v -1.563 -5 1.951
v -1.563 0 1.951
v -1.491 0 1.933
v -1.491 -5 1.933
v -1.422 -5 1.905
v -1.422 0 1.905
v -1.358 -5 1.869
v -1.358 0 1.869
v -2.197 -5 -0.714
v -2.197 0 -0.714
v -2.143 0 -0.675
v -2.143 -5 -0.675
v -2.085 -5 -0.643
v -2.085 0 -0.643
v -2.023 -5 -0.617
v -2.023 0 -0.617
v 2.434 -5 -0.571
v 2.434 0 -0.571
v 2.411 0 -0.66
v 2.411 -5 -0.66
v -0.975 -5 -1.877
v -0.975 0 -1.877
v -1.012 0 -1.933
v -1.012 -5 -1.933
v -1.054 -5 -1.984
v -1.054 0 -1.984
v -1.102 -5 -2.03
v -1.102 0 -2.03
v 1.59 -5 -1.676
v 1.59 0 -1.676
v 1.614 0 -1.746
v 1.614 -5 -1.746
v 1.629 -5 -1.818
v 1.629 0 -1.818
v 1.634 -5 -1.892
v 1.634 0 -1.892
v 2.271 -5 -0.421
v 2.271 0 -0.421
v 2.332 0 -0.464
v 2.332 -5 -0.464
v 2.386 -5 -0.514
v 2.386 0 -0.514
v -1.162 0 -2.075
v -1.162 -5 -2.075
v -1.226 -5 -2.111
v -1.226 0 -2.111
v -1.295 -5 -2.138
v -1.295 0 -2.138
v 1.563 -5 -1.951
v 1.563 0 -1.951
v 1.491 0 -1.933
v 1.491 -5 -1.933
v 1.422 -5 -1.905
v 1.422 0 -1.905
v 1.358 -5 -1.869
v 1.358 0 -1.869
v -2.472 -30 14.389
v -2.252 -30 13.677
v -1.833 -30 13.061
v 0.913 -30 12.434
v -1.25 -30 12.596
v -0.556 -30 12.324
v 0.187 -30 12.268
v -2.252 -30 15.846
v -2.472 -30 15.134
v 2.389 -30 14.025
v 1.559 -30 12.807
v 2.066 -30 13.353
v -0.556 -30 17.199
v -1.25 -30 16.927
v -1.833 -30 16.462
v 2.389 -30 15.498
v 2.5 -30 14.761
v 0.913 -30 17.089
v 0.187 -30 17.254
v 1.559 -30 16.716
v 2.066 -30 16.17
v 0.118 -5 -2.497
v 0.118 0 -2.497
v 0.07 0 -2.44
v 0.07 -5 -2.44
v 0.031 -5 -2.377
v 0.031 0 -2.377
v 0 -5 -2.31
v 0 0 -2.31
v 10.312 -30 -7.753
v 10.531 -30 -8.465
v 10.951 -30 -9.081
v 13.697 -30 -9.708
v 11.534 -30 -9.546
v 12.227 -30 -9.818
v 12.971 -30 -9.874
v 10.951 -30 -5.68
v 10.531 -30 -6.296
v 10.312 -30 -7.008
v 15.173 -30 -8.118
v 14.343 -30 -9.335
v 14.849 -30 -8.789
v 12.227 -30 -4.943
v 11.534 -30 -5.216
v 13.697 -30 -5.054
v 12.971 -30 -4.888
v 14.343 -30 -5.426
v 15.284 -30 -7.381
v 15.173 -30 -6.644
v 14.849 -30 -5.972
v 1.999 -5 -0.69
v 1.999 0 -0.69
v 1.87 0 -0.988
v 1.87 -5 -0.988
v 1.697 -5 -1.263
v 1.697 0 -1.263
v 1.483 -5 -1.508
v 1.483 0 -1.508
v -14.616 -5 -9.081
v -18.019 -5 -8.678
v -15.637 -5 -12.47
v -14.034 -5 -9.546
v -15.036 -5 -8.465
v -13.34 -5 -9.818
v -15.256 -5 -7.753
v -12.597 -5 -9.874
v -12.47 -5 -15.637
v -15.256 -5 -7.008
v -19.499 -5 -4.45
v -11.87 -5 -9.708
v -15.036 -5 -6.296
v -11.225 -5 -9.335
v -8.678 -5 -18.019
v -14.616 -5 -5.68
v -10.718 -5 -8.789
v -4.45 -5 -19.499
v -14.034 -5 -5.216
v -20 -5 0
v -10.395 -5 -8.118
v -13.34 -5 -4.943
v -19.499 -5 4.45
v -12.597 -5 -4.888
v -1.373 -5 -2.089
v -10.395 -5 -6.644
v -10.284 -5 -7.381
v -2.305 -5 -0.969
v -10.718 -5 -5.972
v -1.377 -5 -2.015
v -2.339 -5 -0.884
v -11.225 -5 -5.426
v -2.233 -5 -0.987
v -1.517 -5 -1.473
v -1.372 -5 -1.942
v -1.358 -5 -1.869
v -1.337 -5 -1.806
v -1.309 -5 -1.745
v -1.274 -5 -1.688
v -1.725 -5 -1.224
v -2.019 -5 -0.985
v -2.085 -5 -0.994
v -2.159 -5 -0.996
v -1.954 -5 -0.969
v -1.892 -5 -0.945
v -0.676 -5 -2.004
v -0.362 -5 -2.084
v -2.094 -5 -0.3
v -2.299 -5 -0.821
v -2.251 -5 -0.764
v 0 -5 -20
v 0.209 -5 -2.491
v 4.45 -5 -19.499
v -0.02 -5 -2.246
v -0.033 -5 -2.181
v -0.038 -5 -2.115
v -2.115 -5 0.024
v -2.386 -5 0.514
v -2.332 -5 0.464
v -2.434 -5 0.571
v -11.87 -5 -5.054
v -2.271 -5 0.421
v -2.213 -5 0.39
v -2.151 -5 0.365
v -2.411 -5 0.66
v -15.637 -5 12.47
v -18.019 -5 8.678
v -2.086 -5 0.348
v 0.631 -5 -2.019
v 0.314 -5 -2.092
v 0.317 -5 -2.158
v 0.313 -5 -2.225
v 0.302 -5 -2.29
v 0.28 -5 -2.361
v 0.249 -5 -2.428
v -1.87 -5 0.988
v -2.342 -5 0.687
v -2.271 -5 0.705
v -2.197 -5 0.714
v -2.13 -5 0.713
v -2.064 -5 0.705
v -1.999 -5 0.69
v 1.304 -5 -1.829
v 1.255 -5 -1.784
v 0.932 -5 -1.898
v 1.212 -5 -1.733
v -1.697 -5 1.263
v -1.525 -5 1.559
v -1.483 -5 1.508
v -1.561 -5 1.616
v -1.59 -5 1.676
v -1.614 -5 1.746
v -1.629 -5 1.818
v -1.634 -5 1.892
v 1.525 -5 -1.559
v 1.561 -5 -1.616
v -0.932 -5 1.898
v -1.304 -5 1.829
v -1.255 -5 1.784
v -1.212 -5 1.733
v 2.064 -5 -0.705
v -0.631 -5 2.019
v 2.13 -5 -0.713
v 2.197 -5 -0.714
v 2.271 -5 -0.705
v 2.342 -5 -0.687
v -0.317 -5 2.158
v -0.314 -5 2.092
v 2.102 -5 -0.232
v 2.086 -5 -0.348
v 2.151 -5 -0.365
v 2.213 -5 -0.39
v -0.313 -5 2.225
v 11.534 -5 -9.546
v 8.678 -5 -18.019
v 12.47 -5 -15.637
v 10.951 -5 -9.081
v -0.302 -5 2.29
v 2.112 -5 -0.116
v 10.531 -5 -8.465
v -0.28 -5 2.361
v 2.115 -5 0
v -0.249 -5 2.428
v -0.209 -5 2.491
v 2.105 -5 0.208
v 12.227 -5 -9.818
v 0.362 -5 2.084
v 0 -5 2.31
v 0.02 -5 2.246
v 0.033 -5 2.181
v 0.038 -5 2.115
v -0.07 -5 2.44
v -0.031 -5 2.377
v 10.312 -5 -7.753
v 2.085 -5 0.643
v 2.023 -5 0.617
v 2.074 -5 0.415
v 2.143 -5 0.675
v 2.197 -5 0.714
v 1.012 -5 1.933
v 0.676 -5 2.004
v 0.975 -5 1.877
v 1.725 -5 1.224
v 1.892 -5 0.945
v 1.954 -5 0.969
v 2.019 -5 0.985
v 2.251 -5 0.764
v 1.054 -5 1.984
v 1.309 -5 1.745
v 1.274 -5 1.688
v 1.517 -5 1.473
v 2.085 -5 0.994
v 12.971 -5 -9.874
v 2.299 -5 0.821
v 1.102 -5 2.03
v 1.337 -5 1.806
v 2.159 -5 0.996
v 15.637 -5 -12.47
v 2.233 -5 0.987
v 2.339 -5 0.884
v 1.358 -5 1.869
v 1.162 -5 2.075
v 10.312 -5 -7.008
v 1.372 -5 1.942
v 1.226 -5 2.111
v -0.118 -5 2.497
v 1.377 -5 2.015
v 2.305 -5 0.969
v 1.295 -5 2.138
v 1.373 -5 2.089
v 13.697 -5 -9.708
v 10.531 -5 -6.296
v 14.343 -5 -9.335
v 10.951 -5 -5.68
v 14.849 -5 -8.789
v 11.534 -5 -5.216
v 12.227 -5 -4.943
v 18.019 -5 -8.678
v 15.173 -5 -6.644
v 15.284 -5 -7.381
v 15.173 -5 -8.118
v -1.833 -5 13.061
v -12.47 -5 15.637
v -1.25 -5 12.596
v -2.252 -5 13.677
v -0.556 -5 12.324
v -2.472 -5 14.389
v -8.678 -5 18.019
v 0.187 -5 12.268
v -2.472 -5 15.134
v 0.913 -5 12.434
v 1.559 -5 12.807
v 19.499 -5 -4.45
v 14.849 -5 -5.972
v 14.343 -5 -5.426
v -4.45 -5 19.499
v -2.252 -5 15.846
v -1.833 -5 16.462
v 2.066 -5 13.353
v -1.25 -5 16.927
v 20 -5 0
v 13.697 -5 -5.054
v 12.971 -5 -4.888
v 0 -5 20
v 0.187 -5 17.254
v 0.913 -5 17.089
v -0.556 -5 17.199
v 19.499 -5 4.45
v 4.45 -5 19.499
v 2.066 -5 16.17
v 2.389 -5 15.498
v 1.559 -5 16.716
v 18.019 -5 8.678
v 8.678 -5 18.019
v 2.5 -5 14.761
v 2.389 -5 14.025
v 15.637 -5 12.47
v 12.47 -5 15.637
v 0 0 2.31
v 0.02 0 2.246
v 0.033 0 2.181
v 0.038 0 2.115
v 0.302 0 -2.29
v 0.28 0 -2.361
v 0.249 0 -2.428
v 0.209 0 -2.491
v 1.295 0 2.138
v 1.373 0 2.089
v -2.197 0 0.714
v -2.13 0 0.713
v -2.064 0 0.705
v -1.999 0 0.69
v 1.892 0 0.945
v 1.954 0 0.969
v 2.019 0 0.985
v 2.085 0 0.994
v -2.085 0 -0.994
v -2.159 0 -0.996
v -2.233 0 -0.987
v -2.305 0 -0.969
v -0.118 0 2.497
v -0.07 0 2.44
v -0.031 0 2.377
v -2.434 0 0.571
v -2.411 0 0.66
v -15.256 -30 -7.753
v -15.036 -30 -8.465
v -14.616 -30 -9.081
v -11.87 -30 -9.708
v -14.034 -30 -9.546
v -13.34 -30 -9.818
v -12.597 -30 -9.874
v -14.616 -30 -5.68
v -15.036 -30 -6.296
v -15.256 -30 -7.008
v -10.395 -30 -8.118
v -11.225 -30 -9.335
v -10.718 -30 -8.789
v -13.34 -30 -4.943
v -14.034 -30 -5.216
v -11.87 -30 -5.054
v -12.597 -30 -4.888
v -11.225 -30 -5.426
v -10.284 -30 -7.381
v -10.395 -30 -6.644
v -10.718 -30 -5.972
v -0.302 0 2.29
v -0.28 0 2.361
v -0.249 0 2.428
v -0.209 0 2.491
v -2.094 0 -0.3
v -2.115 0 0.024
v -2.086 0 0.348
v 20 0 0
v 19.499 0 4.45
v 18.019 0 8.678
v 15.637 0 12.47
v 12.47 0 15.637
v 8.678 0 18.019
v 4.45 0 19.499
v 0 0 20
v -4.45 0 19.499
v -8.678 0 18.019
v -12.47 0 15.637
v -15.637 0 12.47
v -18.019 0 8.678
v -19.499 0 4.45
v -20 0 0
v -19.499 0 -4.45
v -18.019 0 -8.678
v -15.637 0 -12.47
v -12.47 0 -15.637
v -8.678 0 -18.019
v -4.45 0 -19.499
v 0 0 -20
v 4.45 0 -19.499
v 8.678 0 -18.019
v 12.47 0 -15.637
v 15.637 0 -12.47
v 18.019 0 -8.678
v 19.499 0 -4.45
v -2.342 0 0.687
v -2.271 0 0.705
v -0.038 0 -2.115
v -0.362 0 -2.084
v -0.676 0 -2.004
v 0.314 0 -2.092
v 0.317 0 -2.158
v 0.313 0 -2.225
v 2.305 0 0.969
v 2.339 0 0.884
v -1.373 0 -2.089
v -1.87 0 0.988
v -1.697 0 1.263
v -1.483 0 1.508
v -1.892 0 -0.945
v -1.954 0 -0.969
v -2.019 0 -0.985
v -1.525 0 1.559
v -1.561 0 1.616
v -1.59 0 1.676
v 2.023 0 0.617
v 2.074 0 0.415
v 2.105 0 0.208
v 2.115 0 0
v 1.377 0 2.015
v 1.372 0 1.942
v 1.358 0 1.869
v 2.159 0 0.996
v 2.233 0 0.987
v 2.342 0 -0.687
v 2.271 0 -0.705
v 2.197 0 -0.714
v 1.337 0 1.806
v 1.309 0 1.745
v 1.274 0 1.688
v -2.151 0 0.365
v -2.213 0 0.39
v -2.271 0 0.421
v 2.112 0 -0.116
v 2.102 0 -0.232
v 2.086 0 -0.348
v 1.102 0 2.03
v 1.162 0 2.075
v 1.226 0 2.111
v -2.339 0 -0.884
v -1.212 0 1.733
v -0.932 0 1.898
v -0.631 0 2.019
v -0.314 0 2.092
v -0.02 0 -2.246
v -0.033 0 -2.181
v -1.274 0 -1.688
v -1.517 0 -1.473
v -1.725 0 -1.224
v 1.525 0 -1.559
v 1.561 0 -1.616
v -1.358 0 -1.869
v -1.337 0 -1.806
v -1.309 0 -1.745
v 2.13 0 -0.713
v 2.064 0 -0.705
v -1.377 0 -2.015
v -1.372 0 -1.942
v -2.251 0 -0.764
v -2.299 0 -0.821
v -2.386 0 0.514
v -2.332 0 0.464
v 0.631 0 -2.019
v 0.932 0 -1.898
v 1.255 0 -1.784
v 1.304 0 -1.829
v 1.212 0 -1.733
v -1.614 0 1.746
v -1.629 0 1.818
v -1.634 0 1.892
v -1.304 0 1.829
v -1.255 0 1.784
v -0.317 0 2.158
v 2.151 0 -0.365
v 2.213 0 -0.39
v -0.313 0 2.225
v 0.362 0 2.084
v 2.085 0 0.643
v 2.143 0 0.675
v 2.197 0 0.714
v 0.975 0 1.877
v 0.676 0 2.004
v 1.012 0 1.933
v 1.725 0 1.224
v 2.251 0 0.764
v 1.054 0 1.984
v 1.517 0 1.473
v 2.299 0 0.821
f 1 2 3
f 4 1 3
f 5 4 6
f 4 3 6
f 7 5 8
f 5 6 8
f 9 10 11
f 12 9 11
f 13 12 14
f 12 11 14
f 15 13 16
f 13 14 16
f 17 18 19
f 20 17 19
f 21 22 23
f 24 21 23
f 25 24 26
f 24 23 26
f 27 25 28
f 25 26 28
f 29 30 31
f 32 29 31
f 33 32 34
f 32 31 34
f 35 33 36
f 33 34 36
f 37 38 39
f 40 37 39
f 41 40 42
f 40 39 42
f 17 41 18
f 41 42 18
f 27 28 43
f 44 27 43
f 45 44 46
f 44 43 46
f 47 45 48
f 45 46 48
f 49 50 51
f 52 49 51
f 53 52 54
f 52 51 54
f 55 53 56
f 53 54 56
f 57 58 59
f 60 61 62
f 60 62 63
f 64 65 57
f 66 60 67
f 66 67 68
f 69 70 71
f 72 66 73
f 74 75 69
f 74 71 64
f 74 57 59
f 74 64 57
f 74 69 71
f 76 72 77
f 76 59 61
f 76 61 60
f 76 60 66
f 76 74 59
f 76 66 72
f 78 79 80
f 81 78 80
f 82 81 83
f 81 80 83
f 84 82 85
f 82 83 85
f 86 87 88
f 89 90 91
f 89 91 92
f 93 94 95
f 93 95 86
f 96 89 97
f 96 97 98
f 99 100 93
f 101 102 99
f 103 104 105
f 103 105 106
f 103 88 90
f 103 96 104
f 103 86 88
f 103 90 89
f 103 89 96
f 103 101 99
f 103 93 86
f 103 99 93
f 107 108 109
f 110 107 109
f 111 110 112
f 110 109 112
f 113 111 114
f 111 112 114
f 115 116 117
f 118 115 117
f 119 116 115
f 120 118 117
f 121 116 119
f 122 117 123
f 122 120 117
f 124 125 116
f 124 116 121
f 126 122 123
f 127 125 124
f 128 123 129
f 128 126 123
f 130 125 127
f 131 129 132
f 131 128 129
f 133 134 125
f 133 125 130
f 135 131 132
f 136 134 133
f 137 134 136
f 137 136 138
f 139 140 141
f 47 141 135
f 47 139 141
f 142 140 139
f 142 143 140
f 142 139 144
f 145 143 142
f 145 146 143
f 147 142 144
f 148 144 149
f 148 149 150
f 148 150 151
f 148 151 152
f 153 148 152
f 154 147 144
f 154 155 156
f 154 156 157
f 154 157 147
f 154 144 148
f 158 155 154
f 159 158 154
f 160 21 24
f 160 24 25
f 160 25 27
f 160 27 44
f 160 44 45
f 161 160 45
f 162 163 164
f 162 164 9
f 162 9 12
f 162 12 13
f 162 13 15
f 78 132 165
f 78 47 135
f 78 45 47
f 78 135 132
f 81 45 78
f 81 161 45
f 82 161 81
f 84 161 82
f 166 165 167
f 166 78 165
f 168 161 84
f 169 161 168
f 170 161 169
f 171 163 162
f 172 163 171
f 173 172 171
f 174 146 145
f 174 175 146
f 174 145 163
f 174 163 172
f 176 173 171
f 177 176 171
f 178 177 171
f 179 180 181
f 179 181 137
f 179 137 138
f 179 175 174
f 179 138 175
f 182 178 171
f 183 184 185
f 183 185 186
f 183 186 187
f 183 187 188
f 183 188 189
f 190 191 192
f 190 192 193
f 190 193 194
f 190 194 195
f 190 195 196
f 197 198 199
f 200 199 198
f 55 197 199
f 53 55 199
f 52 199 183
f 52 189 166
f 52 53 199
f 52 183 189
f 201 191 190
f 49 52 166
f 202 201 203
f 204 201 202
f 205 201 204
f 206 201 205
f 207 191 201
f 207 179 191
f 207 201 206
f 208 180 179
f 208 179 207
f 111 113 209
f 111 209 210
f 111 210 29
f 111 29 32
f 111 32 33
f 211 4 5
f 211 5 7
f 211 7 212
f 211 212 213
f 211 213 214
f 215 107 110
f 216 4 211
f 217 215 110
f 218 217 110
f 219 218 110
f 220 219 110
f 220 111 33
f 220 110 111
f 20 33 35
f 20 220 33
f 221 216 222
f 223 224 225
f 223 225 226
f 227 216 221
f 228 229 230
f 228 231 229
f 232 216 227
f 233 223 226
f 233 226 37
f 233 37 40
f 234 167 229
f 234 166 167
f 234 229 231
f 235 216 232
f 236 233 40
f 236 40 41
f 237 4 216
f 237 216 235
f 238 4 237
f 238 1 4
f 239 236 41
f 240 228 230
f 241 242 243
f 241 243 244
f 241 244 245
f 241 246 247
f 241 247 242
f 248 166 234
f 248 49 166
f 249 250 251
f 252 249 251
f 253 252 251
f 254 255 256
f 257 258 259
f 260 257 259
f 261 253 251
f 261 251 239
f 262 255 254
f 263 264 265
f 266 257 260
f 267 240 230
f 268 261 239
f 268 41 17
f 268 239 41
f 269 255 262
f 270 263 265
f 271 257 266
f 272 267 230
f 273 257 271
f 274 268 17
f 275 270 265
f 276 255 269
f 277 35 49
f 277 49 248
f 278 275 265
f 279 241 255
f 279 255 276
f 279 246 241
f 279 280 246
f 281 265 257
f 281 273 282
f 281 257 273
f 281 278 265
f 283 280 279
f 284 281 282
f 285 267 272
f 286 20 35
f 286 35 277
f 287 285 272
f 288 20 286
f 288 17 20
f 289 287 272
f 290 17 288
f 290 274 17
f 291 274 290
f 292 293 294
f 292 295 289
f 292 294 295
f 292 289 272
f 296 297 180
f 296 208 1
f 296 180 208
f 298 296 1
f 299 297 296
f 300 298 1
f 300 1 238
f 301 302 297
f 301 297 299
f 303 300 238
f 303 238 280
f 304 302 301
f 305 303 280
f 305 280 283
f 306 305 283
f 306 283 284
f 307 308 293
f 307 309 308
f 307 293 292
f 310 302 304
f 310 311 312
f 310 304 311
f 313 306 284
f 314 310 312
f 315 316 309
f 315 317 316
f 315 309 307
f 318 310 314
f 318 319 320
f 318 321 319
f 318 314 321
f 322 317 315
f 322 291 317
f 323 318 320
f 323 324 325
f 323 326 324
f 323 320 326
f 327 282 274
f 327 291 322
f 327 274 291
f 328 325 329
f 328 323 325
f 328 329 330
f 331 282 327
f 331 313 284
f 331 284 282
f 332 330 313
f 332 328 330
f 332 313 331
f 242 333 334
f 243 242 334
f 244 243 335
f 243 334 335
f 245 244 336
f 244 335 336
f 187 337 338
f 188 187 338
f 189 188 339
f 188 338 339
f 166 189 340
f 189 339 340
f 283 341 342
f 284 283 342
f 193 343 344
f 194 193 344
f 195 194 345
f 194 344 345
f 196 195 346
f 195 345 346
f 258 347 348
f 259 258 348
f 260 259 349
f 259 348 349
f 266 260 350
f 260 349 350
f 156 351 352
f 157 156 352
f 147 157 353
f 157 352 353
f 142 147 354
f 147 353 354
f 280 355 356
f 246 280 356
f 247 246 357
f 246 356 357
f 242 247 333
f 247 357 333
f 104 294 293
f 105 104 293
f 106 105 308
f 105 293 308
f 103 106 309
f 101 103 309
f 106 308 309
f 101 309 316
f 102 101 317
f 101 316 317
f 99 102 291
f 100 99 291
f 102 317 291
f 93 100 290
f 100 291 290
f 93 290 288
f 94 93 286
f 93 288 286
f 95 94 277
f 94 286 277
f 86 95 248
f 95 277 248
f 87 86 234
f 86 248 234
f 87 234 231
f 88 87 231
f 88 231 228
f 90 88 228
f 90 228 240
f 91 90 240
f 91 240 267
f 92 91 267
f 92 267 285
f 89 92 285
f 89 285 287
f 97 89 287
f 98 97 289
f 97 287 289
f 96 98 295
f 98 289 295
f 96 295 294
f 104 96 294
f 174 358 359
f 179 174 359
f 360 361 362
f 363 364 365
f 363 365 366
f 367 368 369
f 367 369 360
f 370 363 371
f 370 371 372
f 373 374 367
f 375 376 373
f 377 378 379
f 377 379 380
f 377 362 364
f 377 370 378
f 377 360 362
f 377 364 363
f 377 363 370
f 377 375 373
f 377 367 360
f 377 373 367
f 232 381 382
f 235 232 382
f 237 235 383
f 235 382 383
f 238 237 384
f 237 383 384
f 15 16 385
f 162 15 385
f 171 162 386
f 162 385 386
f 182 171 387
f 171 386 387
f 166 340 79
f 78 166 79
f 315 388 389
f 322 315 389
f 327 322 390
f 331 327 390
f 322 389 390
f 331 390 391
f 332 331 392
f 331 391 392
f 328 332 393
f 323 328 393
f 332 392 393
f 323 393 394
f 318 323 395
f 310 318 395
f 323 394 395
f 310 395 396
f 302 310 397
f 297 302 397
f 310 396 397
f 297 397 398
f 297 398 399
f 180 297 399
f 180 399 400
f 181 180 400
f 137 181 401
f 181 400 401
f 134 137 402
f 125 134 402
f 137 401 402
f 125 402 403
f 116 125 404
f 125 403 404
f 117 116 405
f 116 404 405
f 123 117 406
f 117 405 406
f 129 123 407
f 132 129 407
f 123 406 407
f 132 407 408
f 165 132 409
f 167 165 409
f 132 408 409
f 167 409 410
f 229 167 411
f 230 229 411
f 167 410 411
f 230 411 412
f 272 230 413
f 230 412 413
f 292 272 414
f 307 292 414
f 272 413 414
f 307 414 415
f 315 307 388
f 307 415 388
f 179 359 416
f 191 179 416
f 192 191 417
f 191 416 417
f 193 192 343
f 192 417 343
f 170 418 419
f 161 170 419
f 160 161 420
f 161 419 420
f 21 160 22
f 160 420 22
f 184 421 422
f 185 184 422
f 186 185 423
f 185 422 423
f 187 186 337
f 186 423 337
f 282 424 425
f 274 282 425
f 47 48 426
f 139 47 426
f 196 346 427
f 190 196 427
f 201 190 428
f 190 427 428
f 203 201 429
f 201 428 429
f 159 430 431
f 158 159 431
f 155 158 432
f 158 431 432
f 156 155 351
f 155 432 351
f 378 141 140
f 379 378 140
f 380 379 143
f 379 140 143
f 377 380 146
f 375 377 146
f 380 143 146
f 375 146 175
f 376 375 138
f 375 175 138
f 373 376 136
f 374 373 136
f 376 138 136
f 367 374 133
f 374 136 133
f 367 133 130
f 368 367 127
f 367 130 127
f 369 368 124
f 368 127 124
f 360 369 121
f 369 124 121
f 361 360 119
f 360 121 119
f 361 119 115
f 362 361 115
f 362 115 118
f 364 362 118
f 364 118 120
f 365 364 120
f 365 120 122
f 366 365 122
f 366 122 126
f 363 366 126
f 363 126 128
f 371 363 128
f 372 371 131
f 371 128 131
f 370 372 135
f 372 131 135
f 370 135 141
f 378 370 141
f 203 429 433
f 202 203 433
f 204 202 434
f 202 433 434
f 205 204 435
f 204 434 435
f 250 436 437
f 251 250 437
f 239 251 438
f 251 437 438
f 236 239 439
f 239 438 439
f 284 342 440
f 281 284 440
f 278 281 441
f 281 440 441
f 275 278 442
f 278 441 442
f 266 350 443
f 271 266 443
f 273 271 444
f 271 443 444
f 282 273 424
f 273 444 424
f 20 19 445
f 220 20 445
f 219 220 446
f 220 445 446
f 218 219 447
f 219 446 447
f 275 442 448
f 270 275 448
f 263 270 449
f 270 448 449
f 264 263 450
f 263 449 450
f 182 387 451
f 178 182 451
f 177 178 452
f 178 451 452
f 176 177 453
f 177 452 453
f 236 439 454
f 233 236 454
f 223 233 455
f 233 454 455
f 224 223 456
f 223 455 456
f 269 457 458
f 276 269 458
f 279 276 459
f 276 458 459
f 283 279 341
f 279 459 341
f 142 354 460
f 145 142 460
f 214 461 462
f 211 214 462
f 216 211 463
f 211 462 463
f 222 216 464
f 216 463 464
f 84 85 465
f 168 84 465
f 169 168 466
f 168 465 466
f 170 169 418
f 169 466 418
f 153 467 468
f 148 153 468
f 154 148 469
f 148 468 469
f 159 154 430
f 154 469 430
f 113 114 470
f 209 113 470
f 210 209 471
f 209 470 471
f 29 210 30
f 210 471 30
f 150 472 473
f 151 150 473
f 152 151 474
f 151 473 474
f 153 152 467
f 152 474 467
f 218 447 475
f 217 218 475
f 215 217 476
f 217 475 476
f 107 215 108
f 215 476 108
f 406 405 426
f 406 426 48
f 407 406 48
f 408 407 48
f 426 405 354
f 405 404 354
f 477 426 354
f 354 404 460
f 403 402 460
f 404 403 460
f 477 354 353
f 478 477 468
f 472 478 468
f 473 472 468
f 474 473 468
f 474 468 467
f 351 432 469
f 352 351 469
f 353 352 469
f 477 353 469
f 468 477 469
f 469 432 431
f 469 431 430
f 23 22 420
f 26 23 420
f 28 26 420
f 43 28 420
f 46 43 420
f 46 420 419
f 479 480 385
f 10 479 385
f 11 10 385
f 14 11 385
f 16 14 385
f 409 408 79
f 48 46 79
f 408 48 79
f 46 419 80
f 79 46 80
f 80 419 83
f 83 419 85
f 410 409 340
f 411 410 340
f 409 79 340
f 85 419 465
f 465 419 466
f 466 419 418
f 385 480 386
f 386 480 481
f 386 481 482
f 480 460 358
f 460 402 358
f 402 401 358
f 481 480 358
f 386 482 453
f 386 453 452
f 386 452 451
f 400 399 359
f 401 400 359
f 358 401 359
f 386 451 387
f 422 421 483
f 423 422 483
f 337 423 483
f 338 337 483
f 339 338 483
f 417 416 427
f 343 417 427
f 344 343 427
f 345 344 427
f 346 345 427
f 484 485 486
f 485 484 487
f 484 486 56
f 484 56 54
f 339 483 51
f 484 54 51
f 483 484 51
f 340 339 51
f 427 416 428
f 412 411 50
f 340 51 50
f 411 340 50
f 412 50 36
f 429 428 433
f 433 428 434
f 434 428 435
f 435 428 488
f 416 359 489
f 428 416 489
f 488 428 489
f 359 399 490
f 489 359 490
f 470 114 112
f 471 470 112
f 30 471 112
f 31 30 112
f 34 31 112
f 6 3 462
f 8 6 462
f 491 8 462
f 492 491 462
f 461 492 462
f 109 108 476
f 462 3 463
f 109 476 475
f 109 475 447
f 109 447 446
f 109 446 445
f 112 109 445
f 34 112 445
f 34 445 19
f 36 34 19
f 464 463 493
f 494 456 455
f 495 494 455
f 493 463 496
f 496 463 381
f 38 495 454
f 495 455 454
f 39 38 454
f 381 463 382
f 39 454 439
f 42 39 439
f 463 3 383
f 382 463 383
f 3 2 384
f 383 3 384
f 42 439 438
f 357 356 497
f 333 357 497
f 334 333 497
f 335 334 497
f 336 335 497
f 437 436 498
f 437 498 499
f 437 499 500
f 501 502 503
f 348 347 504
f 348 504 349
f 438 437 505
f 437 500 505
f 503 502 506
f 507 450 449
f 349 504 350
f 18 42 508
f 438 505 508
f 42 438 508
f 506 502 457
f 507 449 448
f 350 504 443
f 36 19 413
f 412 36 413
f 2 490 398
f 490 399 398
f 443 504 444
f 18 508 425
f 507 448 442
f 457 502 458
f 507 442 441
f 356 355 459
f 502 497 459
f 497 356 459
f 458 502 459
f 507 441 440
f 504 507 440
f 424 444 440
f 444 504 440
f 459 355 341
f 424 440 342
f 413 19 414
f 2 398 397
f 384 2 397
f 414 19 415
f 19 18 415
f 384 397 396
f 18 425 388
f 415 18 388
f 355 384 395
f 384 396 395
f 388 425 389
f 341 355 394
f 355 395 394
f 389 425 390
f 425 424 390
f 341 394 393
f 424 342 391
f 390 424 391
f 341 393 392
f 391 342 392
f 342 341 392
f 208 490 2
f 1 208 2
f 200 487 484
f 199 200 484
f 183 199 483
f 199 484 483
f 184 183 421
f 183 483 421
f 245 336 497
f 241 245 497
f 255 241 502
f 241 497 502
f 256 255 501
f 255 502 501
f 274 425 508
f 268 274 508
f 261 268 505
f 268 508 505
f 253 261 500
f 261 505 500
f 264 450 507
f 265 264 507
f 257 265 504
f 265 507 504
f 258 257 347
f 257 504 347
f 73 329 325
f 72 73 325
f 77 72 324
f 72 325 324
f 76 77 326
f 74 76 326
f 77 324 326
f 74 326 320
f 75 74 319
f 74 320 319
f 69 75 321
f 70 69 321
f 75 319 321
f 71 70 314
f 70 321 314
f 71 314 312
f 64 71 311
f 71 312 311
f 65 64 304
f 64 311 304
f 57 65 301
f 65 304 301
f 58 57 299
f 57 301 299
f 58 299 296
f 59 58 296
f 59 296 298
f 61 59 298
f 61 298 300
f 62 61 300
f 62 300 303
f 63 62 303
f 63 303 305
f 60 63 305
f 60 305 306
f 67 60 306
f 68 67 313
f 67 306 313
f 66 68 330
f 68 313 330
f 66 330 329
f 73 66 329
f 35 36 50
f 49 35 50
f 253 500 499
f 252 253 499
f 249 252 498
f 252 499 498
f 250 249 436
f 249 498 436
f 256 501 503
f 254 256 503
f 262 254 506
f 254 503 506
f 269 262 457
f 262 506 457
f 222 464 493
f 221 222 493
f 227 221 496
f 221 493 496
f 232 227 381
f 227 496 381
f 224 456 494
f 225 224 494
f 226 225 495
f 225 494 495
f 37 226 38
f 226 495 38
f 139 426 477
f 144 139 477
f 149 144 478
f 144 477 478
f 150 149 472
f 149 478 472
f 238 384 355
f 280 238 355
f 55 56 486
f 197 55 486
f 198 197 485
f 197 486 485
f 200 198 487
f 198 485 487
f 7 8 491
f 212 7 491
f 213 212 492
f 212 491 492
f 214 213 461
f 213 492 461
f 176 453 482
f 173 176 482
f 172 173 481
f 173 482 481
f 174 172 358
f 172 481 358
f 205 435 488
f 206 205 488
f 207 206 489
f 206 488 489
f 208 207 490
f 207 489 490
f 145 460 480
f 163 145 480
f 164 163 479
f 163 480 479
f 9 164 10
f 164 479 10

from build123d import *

# Parameters (mm, degrees)
F0_R     = 20
F1_DEPTH = 5
F2_R     = 2.5
F3_DEPTH = 25


with BuildPart() as f1:
    # F0 (on Front) → F1 (new body)
    with BuildSketch(Plane.XZ):
        Circle(F0_R)
        with BuildLine():
            ThreePointArc((2.022994, 0.617024), (2.091872, 0.311923), (2.115, 0))
            ThreePointArc((2.115, 0), (2.107794, -0.17444), (2.086225, -0.347692))
            ThreePointArc((2.086225, -0.347692), (2.181907, -0.376409), (2.271319, -0.420964))
            ThreePointArc((2.271319, -0.420964), (2.360037, -0.487855), (2.433965, -0.570799))
            Line((2.433965, -0.570799), (2.411372, -0.65976))
            ThreePointArc((2.411372, -0.65976), (2.306825, -0.697377), (2.196941, -0.713829))
            ThreePointArc((2.196941, -0.713829), (2.097104, -0.710321), (1.999314, -0.689903))
            ThreePointArc((1.999314, -0.689903), (1.788714, -1.128595), (1.483424, -1.507541))
            ThreePointArc((1.483424, -1.507541), (1.543952, -1.587014), (1.590099, -1.675615))
            ThreePointArc((1.590099, -1.675615), (1.622556, -1.781878), (1.633612, -1.892435))
            Line((1.633612, -1.892435), (1.563044, -1.951126))
            ThreePointArc((1.563044, -1.951126), (1.456352, -1.920108), (1.357784, -1.868829))
            ThreePointArc((1.357784, -1.868829), (1.279077, -1.807308), (1.211964, -1.733311))
            ThreePointArc((1.211964, -1.733311), (0.783729, -1.964432), (0.314005, -2.091561))
            ThreePointArc((0.314005, -2.091561), (0.31626, -2.191433), (0.301516, -2.290238))
            ThreePointArc((0.301516, -2.290238), (0.265314, -2.395284), (0.209274, -2.491225))
            Line((0.209274, -2.491225), (0.117686, -2.497228))
            ThreePointArc((0.117686, -2.497228), (0.049603, -2.409422), (0, -2.31))
            ThreePointArc((0, -2.31), (-0.027515, -2.213966), (-0.038315, -2.114653))
            ThreePointArc((-0.038315, -2.114653), (-0.520614, -2.049923), (-0.975353, -1.876675))
            ThreePointArc((-0.975353, -1.876675), (-1.032233, -1.9588), (-1.102237, -2.030068))
            ThreePointArc((-1.102237, -2.030068), (-1.193269, -2.093773), (-1.294999, -2.138452))
            Line((-1.294999, -2.138452), (-1.372624, -2.089475))
            ThreePointArc((-1.372624, -2.089475), (-1.376094, -1.97842), (-1.357784, -1.868829))
            ThreePointArc((-1.357784, -1.868829), (-1.323596, -1.774963), (-1.273959, -1.688269))
            ThreePointArc((-1.273959, -1.688269), (-1.6261, -1.352413), (-1.89216, -0.944964))
            ThreePointArc((-1.89216, -0.944964), (-1.986447, -0.977971), (-2.084972, -0.994481))
            ThreePointArc((-2.084972, -0.994481), (-2.196064, -0.992512), (-2.304627, -0.968863))
            Line((-2.304627, -0.968863), (-2.338638, -0.883612))
            ThreePointArc((-2.338638, -0.883612), (-2.276169, -0.791728), (-2.196941, -0.713829))
            ThreePointArc((-2.196941, -0.713829), (-2.114109, -0.657985), (-2.022994, -0.617024))
            ThreePointArc((-2.022994, -0.617024), (-2.110472, -0.138328), (-2.086225, 0.347692))
            ThreePointArc((-2.086225, 0.347692), (-2.181907, 0.376409), (-2.271319, 0.420964))
            ThreePointArc((-2.271319, 0.420964), (-2.360037, 0.487855), (-2.433965, 0.570799))
            Line((-2.433965, 0.570799), (-2.411372, 0.65976))
            ThreePointArc((-2.411372, 0.65976), (-2.306825, 0.697377), (-2.196941, 0.713829))
            ThreePointArc((-2.196941, 0.713829), (-2.097104, 0.710321), (-1.999314, 0.689903))
            ThreePointArc((-1.999314, 0.689903), (-1.788714, 1.128595), (-1.483424, 1.507541))
            ThreePointArc((-1.483424, 1.507541), (-1.543952, 1.587014), (-1.590099, 1.675615))
            ThreePointArc((-1.590099, 1.675615), (-1.622556, 1.781878), (-1.633612, 1.892435))
            Line((-1.633612, 1.892435), (-1.563044, 1.951126))
            ThreePointArc((-1.563044, 1.951126), (-1.456352, 1.920108), (-1.357784, 1.868829))
            ThreePointArc((-1.357784, 1.868829), (-1.279077, 1.807308), (-1.211964, 1.733311))
            ThreePointArc((-1.211964, 1.733311), (-0.783729, 1.964432), (-0.314005, 2.091561))
            ThreePointArc((-0.314005, 2.091561), (-0.31626, 2.191433), (-0.301516, 2.290238))
            ThreePointArc((-0.301516, 2.290238), (-0.265314, 2.395284), (-0.209274, 2.491225))
            Line((-0.209274, 2.491225), (-0.117686, 2.497228))
            ThreePointArc((-0.117686, 2.497228), (-0.049603, 2.409422), (0, 2.31))
            ThreePointArc((0, 2.31), (0.027515, 2.213966), (0.038315, 2.114653))
            ThreePointArc((0.038315, 2.114653), (0.520614, 2.049923), (0.975353, 1.876675))
            ThreePointArc((0.975353, 1.876675), (1.032233, 1.9588), (1.102237, 2.030068))
            ThreePointArc((1.102237, 2.030068), (1.193269, 2.093773), (1.294999, 2.138452))
            Line((1.294999, 2.138452), (1.372624, 2.089475))
            ThreePointArc((1.372624, 2.089475), (1.376094, 1.97842), (1.357784, 1.868829))
            ThreePointArc((1.357784, 1.868829), (1.323596, 1.774963), (1.273959, 1.688269))
            ThreePointArc((1.273959, 1.688269), (1.6261, 1.352413), (1.89216, 0.944964))
            ThreePointArc((1.89216, 0.944964), (1.986447, 0.977971), (2.084972, 0.994481))
            ThreePointArc((2.084972, 0.994481), (2.196064, 0.992512), (2.304627, 0.968863))
            Line((2.304627, 0.968863), (2.338638, 0.883612))
            ThreePointArc((2.338638, 0.883612), (2.276169, 0.791728), (2.196941, 0.713829))
            ThreePointArc((2.196941, 0.713829), (2.114109, 0.657985), (2.022994, 0.617024))
        make_face(mode=Mode.SUBTRACT)
    extrude(amount=F1_DEPTH)

    # F2 (on face) → F3 (join)
    with BuildSketch(Plane.XZ.offset(5)):
        with Locations((0, 14.761444)):
            Circle(F2_R)
        with Locations((-12.783785, -7.380722)):
            Circle(F2_R)
        with Locations((12.783785, -7.380722)):
            Circle(F2_R)
    extrude(amount=F3_DEPTH)


solid = f1.part
